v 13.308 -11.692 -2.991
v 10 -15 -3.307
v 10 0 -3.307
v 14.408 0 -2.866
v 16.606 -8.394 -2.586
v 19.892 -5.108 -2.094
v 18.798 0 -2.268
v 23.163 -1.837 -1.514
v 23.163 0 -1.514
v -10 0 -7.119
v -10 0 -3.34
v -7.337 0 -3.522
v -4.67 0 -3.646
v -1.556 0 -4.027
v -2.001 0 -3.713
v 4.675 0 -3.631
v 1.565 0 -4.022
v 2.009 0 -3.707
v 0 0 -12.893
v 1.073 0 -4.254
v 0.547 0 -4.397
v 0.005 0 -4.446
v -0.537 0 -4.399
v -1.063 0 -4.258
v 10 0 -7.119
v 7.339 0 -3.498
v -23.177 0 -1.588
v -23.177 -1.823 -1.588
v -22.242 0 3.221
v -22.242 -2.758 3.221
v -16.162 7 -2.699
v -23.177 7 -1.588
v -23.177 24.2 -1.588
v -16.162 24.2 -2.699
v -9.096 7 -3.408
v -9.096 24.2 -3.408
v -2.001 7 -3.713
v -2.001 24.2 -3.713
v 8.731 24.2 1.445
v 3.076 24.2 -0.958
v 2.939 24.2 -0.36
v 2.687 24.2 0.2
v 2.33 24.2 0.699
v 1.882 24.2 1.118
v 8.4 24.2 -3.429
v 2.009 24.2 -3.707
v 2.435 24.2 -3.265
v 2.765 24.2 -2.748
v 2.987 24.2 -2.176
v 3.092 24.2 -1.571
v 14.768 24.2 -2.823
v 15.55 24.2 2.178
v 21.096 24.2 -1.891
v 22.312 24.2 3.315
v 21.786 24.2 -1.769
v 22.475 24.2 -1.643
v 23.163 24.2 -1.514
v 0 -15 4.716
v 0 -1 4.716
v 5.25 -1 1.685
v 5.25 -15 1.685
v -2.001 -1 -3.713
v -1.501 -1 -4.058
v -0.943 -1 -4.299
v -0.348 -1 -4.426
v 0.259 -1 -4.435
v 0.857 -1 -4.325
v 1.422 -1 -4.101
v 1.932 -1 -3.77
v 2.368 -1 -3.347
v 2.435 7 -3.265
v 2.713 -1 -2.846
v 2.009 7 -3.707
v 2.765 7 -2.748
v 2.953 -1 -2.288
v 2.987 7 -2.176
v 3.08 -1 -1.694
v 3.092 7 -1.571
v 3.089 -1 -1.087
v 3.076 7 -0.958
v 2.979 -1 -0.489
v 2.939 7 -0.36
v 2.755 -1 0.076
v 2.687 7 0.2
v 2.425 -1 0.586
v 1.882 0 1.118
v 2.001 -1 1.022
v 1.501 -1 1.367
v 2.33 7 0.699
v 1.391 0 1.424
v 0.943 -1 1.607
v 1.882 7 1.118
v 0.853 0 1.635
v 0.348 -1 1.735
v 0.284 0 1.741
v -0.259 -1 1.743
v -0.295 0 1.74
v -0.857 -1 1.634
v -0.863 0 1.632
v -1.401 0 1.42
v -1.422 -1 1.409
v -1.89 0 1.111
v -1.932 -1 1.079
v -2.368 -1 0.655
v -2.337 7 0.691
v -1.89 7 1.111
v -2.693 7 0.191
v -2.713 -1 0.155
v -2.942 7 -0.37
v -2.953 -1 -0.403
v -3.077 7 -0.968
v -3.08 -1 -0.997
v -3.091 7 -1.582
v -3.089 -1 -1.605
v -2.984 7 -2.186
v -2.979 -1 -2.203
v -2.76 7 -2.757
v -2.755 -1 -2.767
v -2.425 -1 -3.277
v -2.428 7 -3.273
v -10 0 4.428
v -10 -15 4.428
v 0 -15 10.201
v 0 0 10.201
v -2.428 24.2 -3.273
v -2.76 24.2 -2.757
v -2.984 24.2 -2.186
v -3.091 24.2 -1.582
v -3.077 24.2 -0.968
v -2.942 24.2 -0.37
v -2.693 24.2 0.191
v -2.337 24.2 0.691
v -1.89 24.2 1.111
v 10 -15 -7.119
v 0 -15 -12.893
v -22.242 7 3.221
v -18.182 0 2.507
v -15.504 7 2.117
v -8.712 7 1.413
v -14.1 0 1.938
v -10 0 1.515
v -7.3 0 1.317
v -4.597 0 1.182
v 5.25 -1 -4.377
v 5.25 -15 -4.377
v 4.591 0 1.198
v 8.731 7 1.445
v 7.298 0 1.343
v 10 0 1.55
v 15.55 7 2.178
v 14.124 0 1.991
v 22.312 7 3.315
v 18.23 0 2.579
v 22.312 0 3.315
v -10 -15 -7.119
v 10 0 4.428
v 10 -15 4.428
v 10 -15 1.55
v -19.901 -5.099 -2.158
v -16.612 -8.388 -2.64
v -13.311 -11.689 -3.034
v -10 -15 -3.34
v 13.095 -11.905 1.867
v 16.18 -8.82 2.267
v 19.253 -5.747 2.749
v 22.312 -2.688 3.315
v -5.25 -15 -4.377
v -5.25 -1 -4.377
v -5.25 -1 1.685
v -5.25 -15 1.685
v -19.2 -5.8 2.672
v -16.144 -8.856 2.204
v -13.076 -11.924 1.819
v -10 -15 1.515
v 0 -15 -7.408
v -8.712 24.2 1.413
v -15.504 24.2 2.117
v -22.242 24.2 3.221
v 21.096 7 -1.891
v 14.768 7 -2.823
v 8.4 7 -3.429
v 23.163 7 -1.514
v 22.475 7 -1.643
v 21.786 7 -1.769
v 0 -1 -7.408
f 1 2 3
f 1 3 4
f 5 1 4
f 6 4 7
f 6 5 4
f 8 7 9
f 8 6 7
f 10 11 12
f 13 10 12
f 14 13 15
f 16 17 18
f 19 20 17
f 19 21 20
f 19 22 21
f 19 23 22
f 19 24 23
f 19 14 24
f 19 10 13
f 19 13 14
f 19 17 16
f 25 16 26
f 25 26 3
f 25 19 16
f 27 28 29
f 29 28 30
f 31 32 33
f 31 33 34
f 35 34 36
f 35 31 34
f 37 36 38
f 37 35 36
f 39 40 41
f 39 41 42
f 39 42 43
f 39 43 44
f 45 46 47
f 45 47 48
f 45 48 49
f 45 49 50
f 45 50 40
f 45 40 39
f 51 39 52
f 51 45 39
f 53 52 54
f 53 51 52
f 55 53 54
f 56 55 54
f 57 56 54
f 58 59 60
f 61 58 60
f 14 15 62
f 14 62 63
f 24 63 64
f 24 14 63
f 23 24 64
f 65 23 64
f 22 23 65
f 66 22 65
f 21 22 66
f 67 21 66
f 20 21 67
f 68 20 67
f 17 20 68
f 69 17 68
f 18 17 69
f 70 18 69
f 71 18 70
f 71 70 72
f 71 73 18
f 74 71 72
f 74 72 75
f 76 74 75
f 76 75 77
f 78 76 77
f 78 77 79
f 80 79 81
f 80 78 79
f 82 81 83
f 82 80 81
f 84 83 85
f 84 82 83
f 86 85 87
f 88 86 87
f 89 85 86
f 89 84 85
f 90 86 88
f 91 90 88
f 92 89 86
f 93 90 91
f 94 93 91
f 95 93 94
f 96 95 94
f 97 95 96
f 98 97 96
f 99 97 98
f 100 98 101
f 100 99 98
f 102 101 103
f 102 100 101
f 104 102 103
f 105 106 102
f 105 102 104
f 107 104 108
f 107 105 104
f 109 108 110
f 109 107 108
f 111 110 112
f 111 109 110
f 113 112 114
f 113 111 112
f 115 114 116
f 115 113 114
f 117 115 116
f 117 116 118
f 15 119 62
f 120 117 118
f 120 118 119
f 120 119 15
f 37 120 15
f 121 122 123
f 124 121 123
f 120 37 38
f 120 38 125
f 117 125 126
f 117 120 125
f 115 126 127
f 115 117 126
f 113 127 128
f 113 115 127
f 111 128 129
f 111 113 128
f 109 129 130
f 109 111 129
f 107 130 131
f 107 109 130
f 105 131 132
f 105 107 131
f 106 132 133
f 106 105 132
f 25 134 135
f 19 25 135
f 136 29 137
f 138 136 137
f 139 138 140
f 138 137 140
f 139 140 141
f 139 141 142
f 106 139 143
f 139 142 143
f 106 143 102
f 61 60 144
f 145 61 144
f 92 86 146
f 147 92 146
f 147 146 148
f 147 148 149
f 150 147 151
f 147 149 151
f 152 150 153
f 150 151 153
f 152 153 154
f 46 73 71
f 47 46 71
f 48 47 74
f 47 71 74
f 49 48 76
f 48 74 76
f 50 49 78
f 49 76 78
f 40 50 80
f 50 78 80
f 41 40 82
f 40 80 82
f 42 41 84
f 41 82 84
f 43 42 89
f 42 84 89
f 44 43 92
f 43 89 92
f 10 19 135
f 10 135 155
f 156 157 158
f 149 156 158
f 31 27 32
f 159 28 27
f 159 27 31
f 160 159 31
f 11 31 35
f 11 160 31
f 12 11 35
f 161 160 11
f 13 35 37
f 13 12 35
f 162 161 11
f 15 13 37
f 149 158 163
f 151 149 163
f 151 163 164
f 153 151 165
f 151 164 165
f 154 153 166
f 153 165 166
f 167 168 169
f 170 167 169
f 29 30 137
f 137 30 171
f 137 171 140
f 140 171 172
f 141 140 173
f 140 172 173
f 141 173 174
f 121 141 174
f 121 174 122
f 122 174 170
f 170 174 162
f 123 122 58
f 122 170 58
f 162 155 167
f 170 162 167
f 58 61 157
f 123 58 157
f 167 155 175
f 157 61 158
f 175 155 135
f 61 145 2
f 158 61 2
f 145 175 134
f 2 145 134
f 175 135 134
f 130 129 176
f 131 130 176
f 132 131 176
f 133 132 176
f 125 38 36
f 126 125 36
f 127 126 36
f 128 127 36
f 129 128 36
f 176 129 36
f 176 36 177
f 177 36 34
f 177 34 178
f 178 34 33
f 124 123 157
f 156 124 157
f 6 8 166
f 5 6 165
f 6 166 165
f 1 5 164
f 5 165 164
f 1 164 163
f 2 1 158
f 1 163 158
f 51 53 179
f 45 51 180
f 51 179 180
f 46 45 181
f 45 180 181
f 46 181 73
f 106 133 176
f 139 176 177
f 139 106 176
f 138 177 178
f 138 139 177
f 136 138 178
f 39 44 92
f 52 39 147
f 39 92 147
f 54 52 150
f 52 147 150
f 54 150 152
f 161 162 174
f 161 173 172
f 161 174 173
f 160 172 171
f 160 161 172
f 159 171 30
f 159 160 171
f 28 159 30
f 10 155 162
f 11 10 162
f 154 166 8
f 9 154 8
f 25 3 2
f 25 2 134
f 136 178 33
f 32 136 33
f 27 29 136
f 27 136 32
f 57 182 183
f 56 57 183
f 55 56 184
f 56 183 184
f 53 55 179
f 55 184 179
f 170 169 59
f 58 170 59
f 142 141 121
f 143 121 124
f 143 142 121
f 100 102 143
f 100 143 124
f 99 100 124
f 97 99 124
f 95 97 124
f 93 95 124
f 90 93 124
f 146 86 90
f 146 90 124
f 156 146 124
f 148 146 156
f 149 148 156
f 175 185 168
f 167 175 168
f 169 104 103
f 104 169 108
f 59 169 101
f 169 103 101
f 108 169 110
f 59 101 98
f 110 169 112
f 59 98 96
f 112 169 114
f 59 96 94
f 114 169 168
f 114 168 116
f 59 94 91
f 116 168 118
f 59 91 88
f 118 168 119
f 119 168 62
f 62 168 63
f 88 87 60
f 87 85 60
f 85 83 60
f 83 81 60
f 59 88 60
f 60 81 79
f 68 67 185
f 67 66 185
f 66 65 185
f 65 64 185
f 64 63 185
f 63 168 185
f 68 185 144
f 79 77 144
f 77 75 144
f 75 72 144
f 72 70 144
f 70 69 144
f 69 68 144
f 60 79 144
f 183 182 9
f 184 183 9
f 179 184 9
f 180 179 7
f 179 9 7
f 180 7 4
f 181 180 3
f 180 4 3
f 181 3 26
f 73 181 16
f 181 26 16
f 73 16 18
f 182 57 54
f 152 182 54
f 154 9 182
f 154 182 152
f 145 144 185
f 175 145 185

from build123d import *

# Parameters (mm, degrees)
BOSS_EXTRUDE1_DEPTH     = 7
BOSS_EXTRUDE3_DEPTH     = 15
BOSS_EXTRUDE4_DEPTH     = 1
CUT_EXTRUDE1_DEPTH      = 33.699933964
CUT_EXTRUDE1_DEPTH_BACK = 33.699933964
SKETCH2_R               = 3.1
BOSS_EXTRUDE5_DEPTH     = 17.2
CUT_EXTRUDE3_DEPTH      = 37.841358298
CUT_EXTRUDE3_DEPTH_BACK = 37.841358298
CHAMFER1_SIZE           = 15


with BuildPart() as part:
    # Sketch1 → Boss-Extrude1 (new body)
    with BuildSketch(Plane(origin=(0, 0, 0), x_dir=(1, 0, 0), z_dir=(0, 1, 0))):
        with BuildLine():
            Line((-26.590677944, 0.897790933), (-24.677260394, -3.721607667))
            ThreePointArc((-24.677260394, -3.721607667), (-0.012479526, -1.099035349), (24.643498383, -3.80311637))
            Line((24.643498383, -3.80311637), (26.537632348, 0.769727537))
            ThreePointArc((26.537632348, 0.769727537), (26.536056466, 0.805424146), (26.507677261, 0.827134789))
            ThreePointArc((26.507677261, 0.827134789), (-0.03768972, 3.726158505), (-26.590677944, 0.897790933))
        make_face()
    extrude(amount=BOSS_EXTRUDE1_DEPTH)

    # Sketch1<4> → Boss-Extrude3 (add)
    with BuildSketch(Plane(origin=(0, 0, 0), x_dir=(1, 0, 0), z_dir=(0, 1, 0))):
        Polygon((0, 12.892692804), (-10, 7.119190112), (-10, -4.427815272), (0, -10.201317964), (10, -4.427815272), (10, 7.119190112), align=None)
        Polygon((0, 7.407865247), (-5.25, 4.376776333), (-5.25, -1.685401493), (0, -4.716490406), (5.25, -1.685401493), (5.25, 4.376776333), align=None, mode=Mode.SUBTRACT)
    extrude(amount=-BOSS_EXTRUDE3_DEPTH)

    # Sketch1<5> → Boss-Extrude4 (add)
    with BuildSketch(Plane(origin=(0, 0, 0), x_dir=(1, 0, 0), z_dir=(0, 1, 0))):
        Polygon((0, 12.892692804), (-10, 7.119190112), (-10, -4.427815272), (0, -10.201317964), (10, -4.427815272), (10, 7.119190112), align=None)
    extrude(amount=-BOSS_EXTRUDE4_DEPTH)

    # Sketch2 → Cut-Extrude1 (cut, two sides: drawn at the far end of the back side and taken through both)
    with BuildSketch(Plane.XZ.offset(1).offset(-CUT_EXTRUDE1_DEPTH_BACK)):
        with Locations(Location((0, -1.34568742, 0), (0, 0, 229.79522624))):
            Circle(SKETCH2_R)
    extrude(amount=CUT_EXTRUDE1_DEPTH + CUT_EXTRUDE1_DEPTH_BACK, mode=Mode.SUBTRACT)

    # Sketch3 → Boss-Extrude5 (add)
    with BuildSketch(Plane(origin=(0, 7, 0), x_dir=(1, 0, 0), z_dir=(0, 1, 0))):
        with BuildLine():
            ThreePointArc((-1.890425019, -1.111199481), (-12.112919314, -1.714534324), (-22.241796383, -3.220937936))
            Line((-22.241796383, -3.220937936), (-23.176627213, 1.588349763))
            ThreePointArc((-23.176627213, 1.588349763), (-12.634359148, 3.104112575), (-2.001116102, 3.713288389))
            ThreePointArc((-2.001116102, 3.713288389), (-3.099184389, 1.274580997), (-1.890425019, -1.111199481))
        make_face()
        with BuildLine():
            Line((22.31208714, -3.314700634), (23.163482432, 1.513802008))
            ThreePointArc((23.163482432, 1.513802008), (22.130674577, 1.706638646), (21.096276164, 1.890752624))
            ThreePointArc((21.096276164, 1.890752624), (11.587641271, 3.166667106), (2.008990202, 3.706610623))
            ThreePointArc((2.008990202, 3.706610623), (3.098925579, 1.264077023), (1.881941585, -1.117703712))
            ThreePointArc((1.881941585, -1.117703712), (12.145968264, -1.760973798), (22.31208714, -3.314700634))
        make_face()
    extrude(amount=BOSS_EXTRUDE5_DEPTH)

    # Sketch4 → Cut-Extrude3 (cut, two sides: drawn at the far end of the back side and taken through both)
    with BuildSketch(Plane(origin=(0, 7, 0), x_dir=(1, 0, 0), z_dir=(0, 1, 0)).offset(-CUT_EXTRUDE3_DEPTH_BACK)):
        with BuildLine():
            Line((23.163482432, 1.513802008), (22.31208714, -3.314700634))
            ThreePointArc((22.31208714, -3.314700634), (23.479051904, -3.552898091), (24.643498383, -3.80311637))
            Line((24.643498383, -3.80311637), (26.537632348, 0.769727537))
            ThreePointArc((26.537632348, 0.769727537), (26.536056466, 0.805424146), (26.507677261, 0.827134789))
            ThreePointArc((26.507677261, 0.827134789), (24.837933629, 1.181931749), (23.163482432, 1.513802008))
        make_face()
        with BuildLine():
            Line((-22.241796383, -3.220937936), (-23.176627213, 1.588349763))
            ThreePointArc((-23.176627213, 1.588349763), (-24.886067704, 1.255010478), (-26.590677944, 0.897790933))
            Line((-26.590677944, 0.897790933), (-24.677260394, -3.721607667))
            ThreePointArc((-24.677260394, -3.721607667), (-23.460875681, -3.464719015), (-22.241796383, -3.220937936))
        make_face()
    extrude(amount=CUT_EXTRUDE3_DEPTH + CUT_EXTRUDE3_DEPTH_BACK, mode=Mode.SUBTRACT)

    # Chamfer1
    # the kernel refuses this chamfer: 15 mm, written as the material it adds along each edge
    with BuildSketch(Plane(origin=(10, 0, 40.125691349), x_dir=(0.9996219169112966, 0.027495876610586365, 0), z_dir=(0, 0, -1))) as chamfer1_piece_1_section:
        Polygon((CHAMFER1_SIZE * 0.999621916911, CHAMFER1_SIZE * 0.0274958766106), (-CHAMFER1_SIZE * 0.0274958766106, CHAMFER1_SIZE * 0.999621916911), (0, 0), align=None)
    chamfer1_piece_1 = extrude(amount=82.008394033, mode=Mode.PRIVATE)
    chamfer1_piece_1 = chamfer1_piece_1 - Plane(origin=(-0.203357417, -3.100629743, 116.598877624), x_dir=(-0.21189526386996682, 0, -0.9772923805849901), z_dir=(0, -1, 0)) * Cylinder(115.5, 224, mode=Mode.PRIVATE)
    chamfer1_piece_1 = split(chamfer1_piece_1, bisect_by=Plane(origin=(22.567978143, -3.100629743, 1.863470638), z_dir=(-0.9848077530122092, 0, -0.17364817766692403)), keep=Keep.TOP, mode=Mode.PRIVATE)
    chamfer1_piece_1 = chamfer1_piece_1 & Plane(origin=(-0.203357417, -3.100629743, 120.773731271), x_dir=(0.21454646327949964, 0, -0.9767137836102542), z_dir=(0, -1, 0)) * Cylinder(124.5, 224, mode=Mode.PRIVATE)
    add(chamfer1_piece_1)
    with BuildSketch(Plane(origin=(-10, 0, -41.915476478), x_dir=(0.02749587661058632, -0.9996219169112968, 0), z_dir=(0, 0, 1))) as chamfer1_piece_2_section:
        Polygon((CHAMFER1_SIZE * 0.999621916911, -CHAMFER1_SIZE * 0.0274958766106), (-CHAMFER1_SIZE * 0.0274958766106, -CHAMFER1_SIZE * 0.999621916911), (0, 0), align=None)
    chamfer1_piece_2 = extrude(amount=82.005821637, mode=Mode.PRIVATE)
    chamfer1_piece_2 = chamfer1_piece_2 & Plane(origin=(-0.203357417, -2.670719626, 120.773731271), x_dir=(0.21454646327949964, 0, -0.9767137836102542), z_dir=(0, -1, 0)) * Cylinder(124.5, 224, mode=Mode.PRIVATE)
    chamfer1_piece_2 = chamfer1_piece_2 - Plane(origin=(-0.203357417, -2.670719626, 116.598877624), x_dir=(-0.21189526386996682, 0, -0.9772923805849901), z_dir=(0, -1, 0)) * Cylinder(115.5, 224, mode=Mode.PRIVATE)
    chamfer1_piece_2 = split(chamfer1_piece_2, bisect_by=Plane(origin=(-23.112985585, -2.670719626, -1.260941971), z_dir=(0.9816271834476646, 0, -0.1908089953765415)), keep=Keep.TOP, mode=Mode.PRIVATE)
    add(chamfer1_piece_2)


solid = part.part
